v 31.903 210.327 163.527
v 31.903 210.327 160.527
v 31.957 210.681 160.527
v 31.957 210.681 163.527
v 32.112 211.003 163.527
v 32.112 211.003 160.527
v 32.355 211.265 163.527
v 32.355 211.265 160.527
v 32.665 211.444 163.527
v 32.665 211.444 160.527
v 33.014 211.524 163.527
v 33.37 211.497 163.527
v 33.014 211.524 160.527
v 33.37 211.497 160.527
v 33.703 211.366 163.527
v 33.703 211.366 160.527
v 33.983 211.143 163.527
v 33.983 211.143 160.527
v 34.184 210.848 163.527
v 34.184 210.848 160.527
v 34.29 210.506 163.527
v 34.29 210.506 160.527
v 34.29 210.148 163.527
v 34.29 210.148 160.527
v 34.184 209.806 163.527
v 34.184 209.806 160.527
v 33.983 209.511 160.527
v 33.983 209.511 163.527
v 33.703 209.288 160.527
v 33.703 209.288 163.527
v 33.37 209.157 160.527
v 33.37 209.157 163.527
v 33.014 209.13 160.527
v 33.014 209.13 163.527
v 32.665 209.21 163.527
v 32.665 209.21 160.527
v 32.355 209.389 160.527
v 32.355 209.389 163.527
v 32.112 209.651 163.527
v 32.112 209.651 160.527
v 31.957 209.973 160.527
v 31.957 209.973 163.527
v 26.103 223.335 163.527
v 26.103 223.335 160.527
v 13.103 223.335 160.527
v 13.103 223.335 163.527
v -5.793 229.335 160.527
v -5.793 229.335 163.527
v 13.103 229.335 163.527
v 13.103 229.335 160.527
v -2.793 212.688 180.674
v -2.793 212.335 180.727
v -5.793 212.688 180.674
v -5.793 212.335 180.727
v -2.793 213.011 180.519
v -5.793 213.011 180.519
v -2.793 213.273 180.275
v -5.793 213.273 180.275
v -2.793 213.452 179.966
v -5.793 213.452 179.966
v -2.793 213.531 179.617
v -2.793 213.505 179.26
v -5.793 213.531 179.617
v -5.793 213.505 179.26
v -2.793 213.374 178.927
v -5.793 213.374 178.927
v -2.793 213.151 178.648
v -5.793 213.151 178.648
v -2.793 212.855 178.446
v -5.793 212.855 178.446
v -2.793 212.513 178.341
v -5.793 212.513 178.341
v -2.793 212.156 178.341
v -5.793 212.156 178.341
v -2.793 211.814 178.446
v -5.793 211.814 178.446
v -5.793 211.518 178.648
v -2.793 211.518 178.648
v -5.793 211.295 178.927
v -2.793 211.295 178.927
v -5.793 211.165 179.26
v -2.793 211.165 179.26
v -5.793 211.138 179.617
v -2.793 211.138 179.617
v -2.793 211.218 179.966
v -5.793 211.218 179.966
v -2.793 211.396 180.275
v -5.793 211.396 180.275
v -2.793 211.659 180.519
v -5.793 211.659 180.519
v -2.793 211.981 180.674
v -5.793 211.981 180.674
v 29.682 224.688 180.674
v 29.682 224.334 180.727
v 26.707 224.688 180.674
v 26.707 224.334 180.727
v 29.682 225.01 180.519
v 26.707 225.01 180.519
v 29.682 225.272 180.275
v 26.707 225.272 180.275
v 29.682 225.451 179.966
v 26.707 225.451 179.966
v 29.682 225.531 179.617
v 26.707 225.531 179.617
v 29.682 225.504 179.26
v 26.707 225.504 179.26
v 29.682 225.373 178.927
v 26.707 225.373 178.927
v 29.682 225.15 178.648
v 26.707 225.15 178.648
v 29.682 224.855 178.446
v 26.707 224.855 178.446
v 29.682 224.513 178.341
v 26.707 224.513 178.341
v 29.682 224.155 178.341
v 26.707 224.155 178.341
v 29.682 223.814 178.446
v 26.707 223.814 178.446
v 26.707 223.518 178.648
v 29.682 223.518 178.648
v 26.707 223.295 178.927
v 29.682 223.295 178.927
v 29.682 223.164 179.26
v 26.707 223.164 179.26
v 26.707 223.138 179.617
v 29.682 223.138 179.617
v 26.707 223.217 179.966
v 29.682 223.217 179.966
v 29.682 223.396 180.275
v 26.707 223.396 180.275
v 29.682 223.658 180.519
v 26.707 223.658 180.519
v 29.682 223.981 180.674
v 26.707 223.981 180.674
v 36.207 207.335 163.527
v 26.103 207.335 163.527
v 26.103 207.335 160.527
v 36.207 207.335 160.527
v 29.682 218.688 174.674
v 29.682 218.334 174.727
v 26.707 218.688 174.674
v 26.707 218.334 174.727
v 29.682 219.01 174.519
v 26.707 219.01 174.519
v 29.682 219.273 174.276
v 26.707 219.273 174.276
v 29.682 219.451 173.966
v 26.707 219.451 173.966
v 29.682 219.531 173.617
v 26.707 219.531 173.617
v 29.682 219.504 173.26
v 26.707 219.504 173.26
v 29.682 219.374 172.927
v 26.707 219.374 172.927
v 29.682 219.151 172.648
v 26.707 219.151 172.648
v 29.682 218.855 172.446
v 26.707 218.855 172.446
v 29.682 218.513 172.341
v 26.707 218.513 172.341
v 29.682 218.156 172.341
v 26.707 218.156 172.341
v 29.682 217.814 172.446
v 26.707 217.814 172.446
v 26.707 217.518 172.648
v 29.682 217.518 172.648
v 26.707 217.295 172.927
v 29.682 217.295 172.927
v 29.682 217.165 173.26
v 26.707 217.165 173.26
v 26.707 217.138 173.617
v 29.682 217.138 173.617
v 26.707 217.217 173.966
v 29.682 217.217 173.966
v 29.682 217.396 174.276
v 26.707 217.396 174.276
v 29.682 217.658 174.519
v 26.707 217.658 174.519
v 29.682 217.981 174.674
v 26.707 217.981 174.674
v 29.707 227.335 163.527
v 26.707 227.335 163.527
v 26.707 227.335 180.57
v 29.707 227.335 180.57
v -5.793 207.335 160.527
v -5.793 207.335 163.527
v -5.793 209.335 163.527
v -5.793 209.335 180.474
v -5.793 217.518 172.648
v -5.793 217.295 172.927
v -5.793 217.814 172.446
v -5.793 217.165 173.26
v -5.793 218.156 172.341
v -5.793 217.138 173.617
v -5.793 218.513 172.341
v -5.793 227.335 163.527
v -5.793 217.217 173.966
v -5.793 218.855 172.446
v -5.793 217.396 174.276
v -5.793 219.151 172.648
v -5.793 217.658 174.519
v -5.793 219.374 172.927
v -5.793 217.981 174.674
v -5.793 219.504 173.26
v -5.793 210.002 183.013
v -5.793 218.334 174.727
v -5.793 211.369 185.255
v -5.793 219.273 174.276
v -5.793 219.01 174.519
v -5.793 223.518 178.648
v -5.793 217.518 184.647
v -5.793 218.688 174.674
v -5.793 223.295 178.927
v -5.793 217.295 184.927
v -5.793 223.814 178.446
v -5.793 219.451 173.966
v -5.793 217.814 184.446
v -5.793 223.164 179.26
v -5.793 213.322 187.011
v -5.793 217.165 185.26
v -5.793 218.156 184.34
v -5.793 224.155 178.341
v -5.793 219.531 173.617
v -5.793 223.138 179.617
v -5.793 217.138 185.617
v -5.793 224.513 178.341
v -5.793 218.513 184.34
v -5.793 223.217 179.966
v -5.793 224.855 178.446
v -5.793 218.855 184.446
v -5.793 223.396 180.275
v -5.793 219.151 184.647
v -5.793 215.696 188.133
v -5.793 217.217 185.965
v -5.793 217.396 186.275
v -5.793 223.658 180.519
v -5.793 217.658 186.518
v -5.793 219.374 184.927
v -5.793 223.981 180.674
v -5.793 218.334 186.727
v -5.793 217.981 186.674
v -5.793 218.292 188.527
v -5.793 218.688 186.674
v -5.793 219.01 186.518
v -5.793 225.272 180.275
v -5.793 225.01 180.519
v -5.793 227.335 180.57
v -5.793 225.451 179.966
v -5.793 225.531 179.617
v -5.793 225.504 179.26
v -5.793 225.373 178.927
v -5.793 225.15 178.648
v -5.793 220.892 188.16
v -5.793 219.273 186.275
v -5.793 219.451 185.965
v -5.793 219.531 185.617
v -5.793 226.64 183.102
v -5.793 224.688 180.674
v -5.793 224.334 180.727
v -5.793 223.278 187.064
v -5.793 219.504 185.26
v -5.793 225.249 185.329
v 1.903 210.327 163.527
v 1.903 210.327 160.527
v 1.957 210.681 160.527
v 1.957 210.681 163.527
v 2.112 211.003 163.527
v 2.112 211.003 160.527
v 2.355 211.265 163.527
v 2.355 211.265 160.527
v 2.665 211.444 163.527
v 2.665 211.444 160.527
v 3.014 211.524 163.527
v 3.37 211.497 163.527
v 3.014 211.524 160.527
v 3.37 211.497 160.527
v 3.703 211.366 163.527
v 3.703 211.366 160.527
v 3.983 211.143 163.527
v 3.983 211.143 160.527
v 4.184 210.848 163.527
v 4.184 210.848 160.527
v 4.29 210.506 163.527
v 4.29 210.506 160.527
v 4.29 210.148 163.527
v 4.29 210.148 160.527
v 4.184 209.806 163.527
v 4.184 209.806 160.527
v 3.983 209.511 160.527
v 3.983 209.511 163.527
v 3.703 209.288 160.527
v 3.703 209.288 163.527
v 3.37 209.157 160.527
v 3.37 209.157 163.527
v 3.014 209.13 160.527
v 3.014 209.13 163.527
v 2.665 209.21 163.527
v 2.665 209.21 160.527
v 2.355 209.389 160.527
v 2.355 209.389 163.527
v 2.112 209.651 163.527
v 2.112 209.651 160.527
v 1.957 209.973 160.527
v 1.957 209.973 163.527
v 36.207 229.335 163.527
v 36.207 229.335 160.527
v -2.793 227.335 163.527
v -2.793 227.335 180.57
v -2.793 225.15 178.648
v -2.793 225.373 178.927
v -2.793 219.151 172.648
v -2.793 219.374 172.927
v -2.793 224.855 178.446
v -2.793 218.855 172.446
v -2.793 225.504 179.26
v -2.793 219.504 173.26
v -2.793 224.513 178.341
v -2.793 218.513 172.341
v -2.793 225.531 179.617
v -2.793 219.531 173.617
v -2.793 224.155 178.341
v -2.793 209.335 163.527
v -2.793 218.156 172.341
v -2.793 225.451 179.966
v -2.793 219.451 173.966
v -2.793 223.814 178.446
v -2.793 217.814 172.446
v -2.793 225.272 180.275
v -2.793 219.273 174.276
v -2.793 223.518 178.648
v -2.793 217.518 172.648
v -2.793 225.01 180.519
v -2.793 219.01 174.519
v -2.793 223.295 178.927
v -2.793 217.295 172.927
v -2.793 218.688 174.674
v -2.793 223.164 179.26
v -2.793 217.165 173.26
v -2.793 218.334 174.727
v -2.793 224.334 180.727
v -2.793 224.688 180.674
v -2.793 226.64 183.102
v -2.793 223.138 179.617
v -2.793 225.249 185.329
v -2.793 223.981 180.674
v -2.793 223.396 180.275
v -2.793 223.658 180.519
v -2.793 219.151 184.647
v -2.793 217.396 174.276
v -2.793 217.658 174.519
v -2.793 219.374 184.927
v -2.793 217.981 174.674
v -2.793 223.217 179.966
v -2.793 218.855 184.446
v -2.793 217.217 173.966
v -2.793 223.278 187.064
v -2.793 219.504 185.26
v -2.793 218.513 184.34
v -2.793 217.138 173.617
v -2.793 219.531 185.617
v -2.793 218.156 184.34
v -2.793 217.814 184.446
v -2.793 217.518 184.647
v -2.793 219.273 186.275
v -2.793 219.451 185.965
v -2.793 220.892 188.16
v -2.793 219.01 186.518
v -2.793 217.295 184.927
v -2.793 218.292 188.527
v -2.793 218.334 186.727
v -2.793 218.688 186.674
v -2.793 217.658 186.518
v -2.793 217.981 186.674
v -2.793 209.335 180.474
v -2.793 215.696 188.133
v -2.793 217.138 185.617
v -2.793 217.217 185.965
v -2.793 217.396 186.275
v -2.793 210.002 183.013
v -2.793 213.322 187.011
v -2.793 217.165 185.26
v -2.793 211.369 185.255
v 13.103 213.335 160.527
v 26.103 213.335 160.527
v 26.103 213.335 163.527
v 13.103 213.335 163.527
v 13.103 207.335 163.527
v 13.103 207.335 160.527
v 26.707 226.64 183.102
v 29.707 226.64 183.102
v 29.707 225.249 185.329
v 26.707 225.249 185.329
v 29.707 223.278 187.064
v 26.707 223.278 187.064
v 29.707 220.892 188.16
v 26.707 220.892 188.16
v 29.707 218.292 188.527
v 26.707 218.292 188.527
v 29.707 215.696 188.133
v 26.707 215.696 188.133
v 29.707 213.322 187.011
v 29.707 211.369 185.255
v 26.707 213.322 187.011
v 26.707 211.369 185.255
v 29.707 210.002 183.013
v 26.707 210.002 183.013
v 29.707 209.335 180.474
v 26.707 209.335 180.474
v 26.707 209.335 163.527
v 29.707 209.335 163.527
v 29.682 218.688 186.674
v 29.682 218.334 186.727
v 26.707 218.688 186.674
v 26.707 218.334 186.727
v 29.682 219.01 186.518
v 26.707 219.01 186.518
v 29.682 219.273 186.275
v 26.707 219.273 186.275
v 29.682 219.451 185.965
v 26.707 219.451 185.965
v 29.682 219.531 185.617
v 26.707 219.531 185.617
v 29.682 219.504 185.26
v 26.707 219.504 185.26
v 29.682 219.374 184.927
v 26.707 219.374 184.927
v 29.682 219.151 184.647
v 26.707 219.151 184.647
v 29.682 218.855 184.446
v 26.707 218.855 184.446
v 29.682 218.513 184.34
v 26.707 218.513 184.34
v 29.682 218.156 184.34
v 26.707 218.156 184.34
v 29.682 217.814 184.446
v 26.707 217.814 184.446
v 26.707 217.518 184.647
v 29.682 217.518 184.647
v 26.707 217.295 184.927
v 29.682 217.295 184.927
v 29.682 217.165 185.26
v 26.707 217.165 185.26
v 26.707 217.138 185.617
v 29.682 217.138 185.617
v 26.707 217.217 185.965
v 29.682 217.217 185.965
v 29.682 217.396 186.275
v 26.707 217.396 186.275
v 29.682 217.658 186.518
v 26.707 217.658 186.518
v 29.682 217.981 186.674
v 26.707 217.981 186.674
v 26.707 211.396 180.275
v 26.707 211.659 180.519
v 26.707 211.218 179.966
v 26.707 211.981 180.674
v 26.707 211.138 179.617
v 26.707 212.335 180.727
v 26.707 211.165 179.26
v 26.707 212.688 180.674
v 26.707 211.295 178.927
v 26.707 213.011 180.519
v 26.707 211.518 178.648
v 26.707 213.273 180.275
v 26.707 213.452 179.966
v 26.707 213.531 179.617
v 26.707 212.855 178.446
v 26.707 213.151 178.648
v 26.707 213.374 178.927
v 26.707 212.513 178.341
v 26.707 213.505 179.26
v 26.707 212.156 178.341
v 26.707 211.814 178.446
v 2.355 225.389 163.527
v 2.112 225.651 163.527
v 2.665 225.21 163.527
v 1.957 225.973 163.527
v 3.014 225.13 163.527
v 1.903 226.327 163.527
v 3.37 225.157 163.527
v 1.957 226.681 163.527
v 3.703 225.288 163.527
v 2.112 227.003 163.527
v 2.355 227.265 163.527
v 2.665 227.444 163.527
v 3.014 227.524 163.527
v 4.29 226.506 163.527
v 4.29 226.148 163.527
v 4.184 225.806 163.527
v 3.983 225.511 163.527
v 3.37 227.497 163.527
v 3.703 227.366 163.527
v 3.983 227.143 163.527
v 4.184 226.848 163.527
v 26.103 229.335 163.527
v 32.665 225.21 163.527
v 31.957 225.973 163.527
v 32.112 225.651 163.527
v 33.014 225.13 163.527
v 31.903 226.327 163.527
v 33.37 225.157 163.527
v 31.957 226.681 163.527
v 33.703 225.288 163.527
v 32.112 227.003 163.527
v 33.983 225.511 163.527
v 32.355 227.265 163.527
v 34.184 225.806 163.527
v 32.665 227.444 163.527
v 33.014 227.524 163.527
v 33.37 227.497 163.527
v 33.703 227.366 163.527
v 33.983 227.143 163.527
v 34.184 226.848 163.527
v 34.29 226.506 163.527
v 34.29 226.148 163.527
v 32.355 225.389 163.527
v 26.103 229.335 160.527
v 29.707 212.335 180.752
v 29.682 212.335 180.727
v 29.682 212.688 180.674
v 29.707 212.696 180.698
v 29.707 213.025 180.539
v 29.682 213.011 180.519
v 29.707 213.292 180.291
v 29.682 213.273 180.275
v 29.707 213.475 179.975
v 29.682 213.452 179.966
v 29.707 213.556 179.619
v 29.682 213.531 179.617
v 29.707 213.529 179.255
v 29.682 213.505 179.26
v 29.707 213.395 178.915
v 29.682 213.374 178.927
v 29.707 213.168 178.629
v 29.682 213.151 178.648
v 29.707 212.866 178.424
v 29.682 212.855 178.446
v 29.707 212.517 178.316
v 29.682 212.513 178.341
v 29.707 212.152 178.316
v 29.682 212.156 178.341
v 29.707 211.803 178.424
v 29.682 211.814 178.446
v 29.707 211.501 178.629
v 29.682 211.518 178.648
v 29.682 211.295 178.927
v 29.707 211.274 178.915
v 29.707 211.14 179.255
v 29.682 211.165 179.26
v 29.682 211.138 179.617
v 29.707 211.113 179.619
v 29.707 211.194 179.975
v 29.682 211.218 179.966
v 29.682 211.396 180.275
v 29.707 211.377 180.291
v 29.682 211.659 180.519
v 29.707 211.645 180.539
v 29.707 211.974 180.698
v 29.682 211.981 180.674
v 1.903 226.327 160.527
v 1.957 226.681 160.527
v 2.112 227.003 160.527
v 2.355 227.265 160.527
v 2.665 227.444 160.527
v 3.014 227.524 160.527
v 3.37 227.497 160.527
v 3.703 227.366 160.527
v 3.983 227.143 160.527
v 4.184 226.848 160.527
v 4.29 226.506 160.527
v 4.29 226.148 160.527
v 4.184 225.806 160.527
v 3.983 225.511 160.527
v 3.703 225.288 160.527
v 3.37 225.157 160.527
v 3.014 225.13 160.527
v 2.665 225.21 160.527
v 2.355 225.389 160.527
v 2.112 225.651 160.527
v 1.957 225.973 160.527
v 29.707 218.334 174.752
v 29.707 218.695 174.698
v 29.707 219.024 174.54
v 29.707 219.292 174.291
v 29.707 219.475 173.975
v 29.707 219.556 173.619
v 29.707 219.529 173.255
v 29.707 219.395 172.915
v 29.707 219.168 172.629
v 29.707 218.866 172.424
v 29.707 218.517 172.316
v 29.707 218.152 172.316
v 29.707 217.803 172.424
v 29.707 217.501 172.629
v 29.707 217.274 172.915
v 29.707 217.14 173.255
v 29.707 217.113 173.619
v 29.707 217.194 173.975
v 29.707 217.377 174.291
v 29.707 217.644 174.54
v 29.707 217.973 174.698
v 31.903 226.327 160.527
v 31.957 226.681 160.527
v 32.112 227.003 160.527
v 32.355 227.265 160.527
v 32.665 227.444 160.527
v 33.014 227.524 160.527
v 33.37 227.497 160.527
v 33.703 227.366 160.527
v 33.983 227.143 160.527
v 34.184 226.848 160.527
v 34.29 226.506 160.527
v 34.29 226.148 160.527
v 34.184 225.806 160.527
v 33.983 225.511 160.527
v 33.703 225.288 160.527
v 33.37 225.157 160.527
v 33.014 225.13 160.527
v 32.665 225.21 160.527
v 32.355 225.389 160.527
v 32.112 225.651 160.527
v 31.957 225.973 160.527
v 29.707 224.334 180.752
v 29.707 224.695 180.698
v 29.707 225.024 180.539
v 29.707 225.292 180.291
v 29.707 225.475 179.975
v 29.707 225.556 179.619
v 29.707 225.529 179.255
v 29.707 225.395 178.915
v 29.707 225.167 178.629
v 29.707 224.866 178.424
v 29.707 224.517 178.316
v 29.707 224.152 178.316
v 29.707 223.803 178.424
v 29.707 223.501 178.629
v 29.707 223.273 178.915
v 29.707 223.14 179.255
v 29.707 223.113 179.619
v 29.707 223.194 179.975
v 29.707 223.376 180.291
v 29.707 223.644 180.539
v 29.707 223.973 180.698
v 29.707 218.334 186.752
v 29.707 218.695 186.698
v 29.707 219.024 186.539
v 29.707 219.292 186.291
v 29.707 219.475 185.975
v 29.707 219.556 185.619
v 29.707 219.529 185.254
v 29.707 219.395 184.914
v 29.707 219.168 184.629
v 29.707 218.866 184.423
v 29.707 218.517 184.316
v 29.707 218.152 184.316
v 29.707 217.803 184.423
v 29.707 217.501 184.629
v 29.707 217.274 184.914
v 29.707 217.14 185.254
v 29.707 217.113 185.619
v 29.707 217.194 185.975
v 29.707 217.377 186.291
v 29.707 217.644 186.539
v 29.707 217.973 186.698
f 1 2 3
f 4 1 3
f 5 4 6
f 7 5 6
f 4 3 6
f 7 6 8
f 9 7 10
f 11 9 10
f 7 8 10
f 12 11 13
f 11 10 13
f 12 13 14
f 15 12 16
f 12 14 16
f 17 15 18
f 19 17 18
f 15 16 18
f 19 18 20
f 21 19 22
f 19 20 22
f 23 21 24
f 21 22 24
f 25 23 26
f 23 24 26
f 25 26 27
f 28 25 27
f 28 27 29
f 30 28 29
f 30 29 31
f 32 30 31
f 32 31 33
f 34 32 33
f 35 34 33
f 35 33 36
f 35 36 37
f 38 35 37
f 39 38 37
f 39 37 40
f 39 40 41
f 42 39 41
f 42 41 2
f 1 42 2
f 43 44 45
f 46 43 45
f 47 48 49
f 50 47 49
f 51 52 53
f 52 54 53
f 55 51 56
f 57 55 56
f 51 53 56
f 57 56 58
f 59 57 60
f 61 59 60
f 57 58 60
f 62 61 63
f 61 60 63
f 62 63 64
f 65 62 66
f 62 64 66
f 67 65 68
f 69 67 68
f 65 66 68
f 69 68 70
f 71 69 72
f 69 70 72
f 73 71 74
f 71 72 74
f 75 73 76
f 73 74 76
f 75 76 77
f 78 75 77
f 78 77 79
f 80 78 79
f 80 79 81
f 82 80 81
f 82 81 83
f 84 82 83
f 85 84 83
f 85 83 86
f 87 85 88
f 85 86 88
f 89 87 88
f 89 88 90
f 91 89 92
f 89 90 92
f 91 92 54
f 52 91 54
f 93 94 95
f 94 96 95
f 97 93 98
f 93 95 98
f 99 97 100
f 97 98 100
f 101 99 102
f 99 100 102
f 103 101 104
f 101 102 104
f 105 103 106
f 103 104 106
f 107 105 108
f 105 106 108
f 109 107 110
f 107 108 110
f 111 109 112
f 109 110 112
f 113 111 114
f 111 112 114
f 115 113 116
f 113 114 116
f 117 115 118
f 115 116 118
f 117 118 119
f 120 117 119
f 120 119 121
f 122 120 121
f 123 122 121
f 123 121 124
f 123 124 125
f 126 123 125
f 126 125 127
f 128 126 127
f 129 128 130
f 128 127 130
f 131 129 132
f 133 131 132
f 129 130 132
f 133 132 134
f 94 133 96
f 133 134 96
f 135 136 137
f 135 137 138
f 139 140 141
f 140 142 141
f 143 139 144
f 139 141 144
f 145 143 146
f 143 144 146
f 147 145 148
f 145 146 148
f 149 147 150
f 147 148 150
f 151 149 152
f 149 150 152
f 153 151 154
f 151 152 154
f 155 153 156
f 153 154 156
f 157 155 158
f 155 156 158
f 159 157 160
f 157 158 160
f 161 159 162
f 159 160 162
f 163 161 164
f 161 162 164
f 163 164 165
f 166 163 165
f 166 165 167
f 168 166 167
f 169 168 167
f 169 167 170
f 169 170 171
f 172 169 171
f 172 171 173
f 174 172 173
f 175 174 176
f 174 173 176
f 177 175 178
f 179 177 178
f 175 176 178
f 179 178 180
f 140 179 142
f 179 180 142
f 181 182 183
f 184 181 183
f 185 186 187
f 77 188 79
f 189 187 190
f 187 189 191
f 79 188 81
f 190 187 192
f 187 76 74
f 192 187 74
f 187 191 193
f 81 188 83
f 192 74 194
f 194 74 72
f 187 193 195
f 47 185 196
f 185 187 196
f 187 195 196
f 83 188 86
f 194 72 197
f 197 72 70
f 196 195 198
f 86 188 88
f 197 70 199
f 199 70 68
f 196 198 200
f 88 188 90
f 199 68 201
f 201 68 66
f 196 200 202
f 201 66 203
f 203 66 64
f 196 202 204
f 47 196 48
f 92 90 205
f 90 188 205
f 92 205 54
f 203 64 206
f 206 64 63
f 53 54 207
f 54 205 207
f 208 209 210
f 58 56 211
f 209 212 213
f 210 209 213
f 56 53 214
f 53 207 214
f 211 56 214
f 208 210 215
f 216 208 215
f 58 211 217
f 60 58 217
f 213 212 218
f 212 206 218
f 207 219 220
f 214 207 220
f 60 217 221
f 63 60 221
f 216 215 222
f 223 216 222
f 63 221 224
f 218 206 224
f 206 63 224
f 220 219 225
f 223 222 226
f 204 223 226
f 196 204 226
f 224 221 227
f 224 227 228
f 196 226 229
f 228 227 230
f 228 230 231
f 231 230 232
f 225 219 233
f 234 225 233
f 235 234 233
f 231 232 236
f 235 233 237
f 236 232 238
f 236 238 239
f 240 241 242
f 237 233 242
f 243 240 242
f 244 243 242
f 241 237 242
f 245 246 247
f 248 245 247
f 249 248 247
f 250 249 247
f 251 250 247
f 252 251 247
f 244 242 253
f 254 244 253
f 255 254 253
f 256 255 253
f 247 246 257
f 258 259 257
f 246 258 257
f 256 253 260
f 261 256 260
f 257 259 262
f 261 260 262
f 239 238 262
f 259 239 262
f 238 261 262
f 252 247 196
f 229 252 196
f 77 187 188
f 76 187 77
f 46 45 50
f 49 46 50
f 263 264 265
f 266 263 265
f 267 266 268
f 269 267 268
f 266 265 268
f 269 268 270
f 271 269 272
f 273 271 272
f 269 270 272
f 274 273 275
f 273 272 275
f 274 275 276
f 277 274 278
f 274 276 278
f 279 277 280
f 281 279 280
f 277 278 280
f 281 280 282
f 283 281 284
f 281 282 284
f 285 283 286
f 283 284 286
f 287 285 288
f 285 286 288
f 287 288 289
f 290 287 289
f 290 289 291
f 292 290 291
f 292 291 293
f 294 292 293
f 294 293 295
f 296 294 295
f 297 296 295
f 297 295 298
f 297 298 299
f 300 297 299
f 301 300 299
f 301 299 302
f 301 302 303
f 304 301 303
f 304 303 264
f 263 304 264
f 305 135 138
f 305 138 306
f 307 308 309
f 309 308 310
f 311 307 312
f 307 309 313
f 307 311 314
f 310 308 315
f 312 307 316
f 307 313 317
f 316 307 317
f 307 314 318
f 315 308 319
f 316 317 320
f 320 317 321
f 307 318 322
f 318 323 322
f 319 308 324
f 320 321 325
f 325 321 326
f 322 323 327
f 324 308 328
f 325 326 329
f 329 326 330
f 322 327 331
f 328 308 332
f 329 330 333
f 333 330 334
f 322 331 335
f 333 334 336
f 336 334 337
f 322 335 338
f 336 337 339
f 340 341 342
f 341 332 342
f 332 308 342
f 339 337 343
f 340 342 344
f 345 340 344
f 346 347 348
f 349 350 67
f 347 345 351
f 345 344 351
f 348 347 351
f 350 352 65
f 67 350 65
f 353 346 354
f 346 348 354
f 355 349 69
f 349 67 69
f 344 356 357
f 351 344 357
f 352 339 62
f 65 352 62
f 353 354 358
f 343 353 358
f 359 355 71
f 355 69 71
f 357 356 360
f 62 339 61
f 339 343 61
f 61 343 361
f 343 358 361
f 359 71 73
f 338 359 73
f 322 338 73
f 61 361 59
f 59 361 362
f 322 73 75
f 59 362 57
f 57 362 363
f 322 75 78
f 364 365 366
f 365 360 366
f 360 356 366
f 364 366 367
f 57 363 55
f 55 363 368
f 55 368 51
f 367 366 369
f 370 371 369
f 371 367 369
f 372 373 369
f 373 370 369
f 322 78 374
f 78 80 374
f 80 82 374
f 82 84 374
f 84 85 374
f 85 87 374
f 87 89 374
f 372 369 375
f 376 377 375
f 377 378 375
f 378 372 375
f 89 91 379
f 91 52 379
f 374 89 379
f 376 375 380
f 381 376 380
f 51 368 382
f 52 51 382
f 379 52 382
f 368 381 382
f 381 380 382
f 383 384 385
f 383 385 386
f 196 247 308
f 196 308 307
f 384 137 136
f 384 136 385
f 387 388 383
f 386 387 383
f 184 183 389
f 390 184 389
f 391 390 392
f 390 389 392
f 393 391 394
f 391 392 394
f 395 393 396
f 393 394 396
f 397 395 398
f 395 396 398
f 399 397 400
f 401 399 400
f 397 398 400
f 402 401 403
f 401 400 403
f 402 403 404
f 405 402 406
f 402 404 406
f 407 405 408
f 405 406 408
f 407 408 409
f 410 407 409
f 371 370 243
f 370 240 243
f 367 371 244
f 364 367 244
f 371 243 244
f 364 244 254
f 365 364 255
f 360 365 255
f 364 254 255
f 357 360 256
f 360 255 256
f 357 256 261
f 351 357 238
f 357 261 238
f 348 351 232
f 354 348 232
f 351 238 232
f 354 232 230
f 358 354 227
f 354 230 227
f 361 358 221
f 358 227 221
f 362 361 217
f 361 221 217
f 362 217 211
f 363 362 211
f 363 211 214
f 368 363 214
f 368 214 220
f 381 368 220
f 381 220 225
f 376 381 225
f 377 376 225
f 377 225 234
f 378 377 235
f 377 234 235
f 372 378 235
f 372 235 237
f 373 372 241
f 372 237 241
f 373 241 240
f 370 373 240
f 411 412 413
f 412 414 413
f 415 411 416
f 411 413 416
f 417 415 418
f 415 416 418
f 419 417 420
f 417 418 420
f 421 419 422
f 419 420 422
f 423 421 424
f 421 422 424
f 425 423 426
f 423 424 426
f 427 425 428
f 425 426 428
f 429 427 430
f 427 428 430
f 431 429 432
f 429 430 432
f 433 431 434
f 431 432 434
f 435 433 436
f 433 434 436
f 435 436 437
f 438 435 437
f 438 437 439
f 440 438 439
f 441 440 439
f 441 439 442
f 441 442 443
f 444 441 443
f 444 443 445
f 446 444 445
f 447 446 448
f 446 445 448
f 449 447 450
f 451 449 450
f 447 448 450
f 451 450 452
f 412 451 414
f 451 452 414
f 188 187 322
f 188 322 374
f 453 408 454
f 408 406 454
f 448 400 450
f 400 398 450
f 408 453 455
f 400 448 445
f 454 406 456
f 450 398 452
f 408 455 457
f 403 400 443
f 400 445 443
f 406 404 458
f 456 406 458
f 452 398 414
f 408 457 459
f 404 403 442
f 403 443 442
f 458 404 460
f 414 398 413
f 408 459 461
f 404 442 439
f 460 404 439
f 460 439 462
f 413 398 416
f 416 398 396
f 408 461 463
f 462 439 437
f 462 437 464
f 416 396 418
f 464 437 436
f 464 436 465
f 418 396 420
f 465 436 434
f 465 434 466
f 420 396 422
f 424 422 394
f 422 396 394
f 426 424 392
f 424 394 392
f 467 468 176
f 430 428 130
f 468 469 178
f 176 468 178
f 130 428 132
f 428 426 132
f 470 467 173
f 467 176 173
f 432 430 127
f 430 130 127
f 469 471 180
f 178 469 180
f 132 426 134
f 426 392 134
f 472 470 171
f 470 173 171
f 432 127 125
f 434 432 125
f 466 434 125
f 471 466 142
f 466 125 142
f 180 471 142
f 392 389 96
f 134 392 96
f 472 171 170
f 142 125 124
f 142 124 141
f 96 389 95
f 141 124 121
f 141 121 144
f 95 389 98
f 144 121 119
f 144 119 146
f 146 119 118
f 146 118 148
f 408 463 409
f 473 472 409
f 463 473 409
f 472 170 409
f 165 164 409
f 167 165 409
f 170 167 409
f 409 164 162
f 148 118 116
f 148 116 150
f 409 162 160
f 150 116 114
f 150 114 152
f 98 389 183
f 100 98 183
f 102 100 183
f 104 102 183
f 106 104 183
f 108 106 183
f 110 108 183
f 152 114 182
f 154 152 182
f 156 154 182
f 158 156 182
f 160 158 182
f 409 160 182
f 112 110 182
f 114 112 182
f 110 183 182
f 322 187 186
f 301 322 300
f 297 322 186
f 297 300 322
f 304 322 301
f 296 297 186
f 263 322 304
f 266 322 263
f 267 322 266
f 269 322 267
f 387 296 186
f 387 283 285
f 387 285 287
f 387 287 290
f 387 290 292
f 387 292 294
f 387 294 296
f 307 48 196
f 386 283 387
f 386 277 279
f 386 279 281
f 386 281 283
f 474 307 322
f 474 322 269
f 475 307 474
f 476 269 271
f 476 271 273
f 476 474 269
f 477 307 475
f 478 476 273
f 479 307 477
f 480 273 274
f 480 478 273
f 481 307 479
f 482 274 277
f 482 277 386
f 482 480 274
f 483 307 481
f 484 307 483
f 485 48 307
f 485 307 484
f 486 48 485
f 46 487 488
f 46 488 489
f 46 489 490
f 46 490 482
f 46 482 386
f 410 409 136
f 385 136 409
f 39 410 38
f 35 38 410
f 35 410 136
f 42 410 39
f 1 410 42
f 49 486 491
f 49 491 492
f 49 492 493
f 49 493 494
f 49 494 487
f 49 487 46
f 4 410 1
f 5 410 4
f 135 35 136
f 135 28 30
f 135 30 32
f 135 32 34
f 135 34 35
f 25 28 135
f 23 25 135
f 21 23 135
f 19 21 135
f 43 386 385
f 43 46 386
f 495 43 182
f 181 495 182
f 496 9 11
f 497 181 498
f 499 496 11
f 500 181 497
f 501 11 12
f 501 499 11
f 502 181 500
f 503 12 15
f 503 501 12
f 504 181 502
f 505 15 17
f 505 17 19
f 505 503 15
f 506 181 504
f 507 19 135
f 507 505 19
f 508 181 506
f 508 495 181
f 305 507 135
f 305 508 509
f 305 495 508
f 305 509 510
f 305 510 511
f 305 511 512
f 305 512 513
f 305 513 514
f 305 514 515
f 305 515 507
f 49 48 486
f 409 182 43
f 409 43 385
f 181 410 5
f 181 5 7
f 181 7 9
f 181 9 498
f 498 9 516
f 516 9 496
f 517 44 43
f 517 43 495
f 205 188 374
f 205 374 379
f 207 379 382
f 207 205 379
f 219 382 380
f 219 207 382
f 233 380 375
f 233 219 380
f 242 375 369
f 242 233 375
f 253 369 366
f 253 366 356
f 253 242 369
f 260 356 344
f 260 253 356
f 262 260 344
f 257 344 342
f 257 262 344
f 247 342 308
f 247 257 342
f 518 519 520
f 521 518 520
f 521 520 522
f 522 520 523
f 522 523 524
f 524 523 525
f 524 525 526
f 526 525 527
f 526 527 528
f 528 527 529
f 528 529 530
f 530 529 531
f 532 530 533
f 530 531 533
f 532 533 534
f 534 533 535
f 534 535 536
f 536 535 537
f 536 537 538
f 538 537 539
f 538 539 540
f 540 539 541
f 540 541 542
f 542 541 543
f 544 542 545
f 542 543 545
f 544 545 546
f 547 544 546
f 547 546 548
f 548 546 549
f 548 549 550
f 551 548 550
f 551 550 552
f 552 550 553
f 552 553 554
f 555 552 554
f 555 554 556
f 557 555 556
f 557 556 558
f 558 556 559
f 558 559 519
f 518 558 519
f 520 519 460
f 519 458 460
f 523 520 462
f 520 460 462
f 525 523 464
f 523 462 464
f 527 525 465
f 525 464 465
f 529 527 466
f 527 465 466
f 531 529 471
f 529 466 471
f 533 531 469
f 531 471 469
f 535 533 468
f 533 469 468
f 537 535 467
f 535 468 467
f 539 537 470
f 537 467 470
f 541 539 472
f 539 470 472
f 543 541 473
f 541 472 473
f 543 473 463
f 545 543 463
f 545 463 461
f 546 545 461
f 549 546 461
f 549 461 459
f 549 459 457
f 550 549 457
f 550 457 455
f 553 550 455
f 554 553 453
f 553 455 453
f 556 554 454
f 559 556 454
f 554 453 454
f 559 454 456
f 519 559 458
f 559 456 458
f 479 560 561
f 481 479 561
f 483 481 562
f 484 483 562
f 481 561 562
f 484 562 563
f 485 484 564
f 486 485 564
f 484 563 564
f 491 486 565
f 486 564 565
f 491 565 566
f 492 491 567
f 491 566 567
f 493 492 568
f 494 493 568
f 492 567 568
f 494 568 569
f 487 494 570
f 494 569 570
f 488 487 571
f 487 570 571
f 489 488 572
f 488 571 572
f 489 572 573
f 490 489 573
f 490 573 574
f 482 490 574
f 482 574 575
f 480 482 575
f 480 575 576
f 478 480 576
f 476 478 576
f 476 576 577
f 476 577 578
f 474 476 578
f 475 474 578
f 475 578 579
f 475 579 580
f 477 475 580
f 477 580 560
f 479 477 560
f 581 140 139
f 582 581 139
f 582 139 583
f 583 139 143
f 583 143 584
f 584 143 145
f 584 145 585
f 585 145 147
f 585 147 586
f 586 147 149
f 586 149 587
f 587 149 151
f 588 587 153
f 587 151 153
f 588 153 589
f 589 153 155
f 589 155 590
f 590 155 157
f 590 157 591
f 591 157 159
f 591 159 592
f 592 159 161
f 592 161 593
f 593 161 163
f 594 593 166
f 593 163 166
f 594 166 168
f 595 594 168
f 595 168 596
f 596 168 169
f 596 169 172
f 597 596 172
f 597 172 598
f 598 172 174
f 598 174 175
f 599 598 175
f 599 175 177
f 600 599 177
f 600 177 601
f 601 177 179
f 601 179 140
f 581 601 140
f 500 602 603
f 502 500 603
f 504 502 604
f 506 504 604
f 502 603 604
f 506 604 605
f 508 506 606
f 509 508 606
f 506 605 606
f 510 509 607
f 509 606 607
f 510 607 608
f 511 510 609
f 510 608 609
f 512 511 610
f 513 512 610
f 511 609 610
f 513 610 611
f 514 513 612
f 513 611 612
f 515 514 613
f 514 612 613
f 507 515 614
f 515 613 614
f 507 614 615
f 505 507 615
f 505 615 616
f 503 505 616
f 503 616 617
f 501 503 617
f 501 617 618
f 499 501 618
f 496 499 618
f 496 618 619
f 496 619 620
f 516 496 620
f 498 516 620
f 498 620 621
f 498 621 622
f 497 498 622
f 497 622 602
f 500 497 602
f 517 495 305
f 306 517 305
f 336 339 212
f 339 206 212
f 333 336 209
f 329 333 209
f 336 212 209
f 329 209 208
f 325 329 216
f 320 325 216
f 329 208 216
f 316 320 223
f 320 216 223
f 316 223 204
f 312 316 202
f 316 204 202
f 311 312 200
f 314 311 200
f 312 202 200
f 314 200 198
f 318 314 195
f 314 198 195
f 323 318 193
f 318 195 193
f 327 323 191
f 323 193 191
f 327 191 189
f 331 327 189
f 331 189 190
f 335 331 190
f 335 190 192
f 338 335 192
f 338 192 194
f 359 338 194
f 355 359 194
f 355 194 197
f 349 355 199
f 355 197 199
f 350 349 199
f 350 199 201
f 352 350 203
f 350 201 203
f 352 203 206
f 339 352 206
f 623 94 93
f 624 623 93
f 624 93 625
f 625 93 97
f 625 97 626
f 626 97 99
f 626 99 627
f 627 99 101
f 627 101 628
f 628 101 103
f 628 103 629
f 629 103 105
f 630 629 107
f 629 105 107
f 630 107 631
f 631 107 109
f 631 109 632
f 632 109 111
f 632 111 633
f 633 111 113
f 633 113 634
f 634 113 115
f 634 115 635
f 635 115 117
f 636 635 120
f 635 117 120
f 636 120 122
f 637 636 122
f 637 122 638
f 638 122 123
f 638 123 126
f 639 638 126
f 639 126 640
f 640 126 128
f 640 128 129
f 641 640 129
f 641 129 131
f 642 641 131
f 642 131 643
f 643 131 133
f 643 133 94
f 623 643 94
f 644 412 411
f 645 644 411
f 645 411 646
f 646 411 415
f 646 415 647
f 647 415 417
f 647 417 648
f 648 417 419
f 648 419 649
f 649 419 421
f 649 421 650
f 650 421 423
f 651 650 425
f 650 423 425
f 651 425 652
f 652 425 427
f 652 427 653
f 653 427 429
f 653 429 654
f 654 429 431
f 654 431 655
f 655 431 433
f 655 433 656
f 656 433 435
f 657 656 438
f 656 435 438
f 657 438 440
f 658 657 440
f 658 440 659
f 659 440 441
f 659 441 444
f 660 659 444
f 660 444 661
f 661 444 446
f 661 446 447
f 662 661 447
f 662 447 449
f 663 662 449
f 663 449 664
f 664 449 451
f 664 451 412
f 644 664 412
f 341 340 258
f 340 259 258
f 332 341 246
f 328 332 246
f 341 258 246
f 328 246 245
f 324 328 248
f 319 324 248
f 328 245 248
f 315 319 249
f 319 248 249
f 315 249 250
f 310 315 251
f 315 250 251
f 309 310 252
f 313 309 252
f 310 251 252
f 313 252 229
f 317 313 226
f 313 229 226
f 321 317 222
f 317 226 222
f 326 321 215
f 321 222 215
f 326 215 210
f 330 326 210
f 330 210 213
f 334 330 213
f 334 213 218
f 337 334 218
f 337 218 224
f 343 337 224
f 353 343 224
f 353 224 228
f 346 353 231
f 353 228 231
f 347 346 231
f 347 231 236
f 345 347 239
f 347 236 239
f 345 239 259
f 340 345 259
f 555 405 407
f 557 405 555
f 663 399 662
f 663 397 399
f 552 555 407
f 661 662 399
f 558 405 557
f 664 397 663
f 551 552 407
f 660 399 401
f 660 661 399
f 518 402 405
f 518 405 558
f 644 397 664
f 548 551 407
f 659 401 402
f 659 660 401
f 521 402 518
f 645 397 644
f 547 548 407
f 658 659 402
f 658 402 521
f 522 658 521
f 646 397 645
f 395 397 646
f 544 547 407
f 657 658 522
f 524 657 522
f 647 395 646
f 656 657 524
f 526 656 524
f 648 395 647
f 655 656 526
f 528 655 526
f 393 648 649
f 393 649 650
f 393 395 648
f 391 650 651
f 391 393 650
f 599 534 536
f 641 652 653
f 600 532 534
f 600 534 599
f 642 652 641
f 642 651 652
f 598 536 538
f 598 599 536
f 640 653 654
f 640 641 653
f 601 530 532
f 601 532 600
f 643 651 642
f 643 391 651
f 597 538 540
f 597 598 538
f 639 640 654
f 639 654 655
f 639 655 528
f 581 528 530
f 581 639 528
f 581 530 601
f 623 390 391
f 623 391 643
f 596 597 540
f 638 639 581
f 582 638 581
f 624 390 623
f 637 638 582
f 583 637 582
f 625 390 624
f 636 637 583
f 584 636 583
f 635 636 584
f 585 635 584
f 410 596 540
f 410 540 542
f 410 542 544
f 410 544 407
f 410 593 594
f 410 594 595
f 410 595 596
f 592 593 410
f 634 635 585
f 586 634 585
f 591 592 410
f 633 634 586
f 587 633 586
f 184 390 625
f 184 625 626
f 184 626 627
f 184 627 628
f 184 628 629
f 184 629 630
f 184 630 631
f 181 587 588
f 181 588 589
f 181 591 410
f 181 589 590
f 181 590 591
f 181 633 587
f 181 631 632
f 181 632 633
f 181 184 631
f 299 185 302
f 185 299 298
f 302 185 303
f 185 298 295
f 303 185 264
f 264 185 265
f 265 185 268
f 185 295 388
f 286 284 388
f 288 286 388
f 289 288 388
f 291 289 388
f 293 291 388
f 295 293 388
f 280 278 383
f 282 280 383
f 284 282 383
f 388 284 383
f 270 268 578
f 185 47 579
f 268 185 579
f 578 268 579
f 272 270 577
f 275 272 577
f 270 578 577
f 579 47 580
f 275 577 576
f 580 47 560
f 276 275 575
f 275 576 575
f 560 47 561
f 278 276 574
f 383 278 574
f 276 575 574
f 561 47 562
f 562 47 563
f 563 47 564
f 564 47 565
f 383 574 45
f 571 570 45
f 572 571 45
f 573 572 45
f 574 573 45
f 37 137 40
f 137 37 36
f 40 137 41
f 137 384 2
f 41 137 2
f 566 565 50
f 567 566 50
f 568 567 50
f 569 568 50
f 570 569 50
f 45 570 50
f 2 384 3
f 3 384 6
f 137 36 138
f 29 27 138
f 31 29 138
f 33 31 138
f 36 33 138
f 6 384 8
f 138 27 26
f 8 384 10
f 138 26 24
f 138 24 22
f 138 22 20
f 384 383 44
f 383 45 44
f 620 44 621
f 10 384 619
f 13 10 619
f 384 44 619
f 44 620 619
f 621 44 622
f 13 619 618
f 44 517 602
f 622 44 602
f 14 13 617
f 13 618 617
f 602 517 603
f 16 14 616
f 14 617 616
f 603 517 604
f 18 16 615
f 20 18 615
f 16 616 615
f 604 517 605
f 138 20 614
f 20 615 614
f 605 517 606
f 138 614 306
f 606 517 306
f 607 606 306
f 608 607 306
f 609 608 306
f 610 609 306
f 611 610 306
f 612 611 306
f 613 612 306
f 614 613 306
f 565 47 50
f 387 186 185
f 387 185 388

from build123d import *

# Parameters (mm, degrees)
SKETCH1_W                      = 42
SKETCH1_H                      = 22
BOSS_EXTRUDE1_DEPTH            = 3
SKETCH2_W                      = 13
SKETCH2_H                      = 6
CUT_EXTRUDE1_DEPTH             = 233.19450244
SKETCH3_W                      = 13
SKETCH3_H                      = 6
CUT_EXTRUDE2_DEPTH             = 233.19450244
BOSS_EXTRUDE2_DEPTH            = 3
BOSS_EXTRUDE3_START            = -3
BOSS_EXTRUDE3_DEPTH            = 3
M2_CLEARANCE_HOLE1_D           = 2.4
M2_CLEARANCE_HOLE1_CSINK_D     = 2.45
M2_CLEARANCE_HOLE1_CSINK_ANGLE = 90
M2_CLEARANCE_HOLE2_D           = 2.4


with BuildPart() as part:
    # Sketch1 → Boss-Extrude1 (new body)
    with BuildSketch(Plane.XY.offset(163.526991532)):
        with Locations((15.20664665, 218.33461514)):
            Rectangle(SKETCH1_W, SKETCH1_H)
    extrude(amount=-BOSS_EXTRUDE1_DEPTH)

    # Sketch2 → Cut-Extrude1 (cut, through all)
    with BuildSketch(Plane(origin=(0, 0, 160.526991532), x_dir=(-1, 0, 0), z_dir=(0, 0, -1))):
        with Locations((-19.603323325, 226.33461514)):
            Rectangle(SKETCH2_W, SKETCH2_H)
    extrude(amount=-CUT_EXTRUDE1_DEPTH, mode=Mode.SUBTRACT)

    # Sketch3 → Cut-Extrude2 (cut, through all)
    with BuildSketch(Plane(origin=(0, 0, 160.526991532), x_dir=(-1, 0, 0), z_dir=(0, 0, -1))):
        with Locations((-19.603323325, 210.33461514)):
            Rectangle(SKETCH3_W, SKETCH3_H)
    extrude(amount=-CUT_EXTRUDE2_DEPTH, mode=Mode.SUBTRACT)

    # Sketch4 → Boss-Extrude2 (add)
    with BuildSketch(Plane(origin=(-5.79335335, 0, 0), x_dir=(0, -1, 0), z_dir=(-1, 0, 0))):
        with BuildLine():
            Line((-227.33461514, 180.570138914), (-227.33461514, 163.526991532))
            Line((-227.33461514, 163.526991532), (-209.33461514, 163.526991532))
            Line((-209.33461514, 163.526991532), (-209.33461514, 180.47391761))
            ThreePointArc((-209.33461514, 180.47391761), (-218.291824267, 188.52686382), (-227.33461514, 180.570138914))
        make_face()
    extrude(amount=-BOSS_EXTRUDE2_DEPTH)

    # Sketch5 → Boss-Extrude3 (add)
    with BuildSketch(Plane(origin=(29.70664665, 0, 0), x_dir=(0, 0, -1), z_dir=(1, 0, 0)).offset(BOSS_EXTRUDE3_START)):
        with BuildLine():
            Line((-180.47391761, 209.33461514), (-163.526991532, 209.33461514))
            Line((-163.526991532, 209.33461514), (-163.526991532, 227.33461514))
            Line((-163.526991532, 227.33461514), (-180.570138914, 227.33461514))
            ThreePointArc((-180.570138914, 227.33461514), (-188.52686382, 218.291824267), (-180.47391761, 209.33461514))
        make_face()
    extrude(amount=BOSS_EXTRUDE3_DEPTH)

    # M2 Clearance Hole1 (through all)
    with Locations(Plane(origin=(29.70664665, 0, 0), x_dir=(0, 0, -1), z_dir=(1, 0, 0))):
        with Locations((-179.527190494, 224.334217217), (-185.526991532, 218.334416179), (-179.527190494, 212.33461514), (-173.527389456, 218.334416179)):
            CounterSinkHole(M2_CLEARANCE_HOLE1_D / 2, M2_CLEARANCE_HOLE1_CSINK_D / 2, counter_sink_angle=M2_CLEARANCE_HOLE1_CSINK_ANGLE)

    # M2 Clearance Hole2 (through all)
    with Locations(Plane.XY.offset(163.526991532)):
        with Locations((3.103323325, 226.326974637), (3.103323325, 210.326974637), (33.103323325, 210.326974637), (33.103323325, 226.326974637)):
            Hole(M2_CLEARANCE_HOLE2_D / 2)


solid = part.part
